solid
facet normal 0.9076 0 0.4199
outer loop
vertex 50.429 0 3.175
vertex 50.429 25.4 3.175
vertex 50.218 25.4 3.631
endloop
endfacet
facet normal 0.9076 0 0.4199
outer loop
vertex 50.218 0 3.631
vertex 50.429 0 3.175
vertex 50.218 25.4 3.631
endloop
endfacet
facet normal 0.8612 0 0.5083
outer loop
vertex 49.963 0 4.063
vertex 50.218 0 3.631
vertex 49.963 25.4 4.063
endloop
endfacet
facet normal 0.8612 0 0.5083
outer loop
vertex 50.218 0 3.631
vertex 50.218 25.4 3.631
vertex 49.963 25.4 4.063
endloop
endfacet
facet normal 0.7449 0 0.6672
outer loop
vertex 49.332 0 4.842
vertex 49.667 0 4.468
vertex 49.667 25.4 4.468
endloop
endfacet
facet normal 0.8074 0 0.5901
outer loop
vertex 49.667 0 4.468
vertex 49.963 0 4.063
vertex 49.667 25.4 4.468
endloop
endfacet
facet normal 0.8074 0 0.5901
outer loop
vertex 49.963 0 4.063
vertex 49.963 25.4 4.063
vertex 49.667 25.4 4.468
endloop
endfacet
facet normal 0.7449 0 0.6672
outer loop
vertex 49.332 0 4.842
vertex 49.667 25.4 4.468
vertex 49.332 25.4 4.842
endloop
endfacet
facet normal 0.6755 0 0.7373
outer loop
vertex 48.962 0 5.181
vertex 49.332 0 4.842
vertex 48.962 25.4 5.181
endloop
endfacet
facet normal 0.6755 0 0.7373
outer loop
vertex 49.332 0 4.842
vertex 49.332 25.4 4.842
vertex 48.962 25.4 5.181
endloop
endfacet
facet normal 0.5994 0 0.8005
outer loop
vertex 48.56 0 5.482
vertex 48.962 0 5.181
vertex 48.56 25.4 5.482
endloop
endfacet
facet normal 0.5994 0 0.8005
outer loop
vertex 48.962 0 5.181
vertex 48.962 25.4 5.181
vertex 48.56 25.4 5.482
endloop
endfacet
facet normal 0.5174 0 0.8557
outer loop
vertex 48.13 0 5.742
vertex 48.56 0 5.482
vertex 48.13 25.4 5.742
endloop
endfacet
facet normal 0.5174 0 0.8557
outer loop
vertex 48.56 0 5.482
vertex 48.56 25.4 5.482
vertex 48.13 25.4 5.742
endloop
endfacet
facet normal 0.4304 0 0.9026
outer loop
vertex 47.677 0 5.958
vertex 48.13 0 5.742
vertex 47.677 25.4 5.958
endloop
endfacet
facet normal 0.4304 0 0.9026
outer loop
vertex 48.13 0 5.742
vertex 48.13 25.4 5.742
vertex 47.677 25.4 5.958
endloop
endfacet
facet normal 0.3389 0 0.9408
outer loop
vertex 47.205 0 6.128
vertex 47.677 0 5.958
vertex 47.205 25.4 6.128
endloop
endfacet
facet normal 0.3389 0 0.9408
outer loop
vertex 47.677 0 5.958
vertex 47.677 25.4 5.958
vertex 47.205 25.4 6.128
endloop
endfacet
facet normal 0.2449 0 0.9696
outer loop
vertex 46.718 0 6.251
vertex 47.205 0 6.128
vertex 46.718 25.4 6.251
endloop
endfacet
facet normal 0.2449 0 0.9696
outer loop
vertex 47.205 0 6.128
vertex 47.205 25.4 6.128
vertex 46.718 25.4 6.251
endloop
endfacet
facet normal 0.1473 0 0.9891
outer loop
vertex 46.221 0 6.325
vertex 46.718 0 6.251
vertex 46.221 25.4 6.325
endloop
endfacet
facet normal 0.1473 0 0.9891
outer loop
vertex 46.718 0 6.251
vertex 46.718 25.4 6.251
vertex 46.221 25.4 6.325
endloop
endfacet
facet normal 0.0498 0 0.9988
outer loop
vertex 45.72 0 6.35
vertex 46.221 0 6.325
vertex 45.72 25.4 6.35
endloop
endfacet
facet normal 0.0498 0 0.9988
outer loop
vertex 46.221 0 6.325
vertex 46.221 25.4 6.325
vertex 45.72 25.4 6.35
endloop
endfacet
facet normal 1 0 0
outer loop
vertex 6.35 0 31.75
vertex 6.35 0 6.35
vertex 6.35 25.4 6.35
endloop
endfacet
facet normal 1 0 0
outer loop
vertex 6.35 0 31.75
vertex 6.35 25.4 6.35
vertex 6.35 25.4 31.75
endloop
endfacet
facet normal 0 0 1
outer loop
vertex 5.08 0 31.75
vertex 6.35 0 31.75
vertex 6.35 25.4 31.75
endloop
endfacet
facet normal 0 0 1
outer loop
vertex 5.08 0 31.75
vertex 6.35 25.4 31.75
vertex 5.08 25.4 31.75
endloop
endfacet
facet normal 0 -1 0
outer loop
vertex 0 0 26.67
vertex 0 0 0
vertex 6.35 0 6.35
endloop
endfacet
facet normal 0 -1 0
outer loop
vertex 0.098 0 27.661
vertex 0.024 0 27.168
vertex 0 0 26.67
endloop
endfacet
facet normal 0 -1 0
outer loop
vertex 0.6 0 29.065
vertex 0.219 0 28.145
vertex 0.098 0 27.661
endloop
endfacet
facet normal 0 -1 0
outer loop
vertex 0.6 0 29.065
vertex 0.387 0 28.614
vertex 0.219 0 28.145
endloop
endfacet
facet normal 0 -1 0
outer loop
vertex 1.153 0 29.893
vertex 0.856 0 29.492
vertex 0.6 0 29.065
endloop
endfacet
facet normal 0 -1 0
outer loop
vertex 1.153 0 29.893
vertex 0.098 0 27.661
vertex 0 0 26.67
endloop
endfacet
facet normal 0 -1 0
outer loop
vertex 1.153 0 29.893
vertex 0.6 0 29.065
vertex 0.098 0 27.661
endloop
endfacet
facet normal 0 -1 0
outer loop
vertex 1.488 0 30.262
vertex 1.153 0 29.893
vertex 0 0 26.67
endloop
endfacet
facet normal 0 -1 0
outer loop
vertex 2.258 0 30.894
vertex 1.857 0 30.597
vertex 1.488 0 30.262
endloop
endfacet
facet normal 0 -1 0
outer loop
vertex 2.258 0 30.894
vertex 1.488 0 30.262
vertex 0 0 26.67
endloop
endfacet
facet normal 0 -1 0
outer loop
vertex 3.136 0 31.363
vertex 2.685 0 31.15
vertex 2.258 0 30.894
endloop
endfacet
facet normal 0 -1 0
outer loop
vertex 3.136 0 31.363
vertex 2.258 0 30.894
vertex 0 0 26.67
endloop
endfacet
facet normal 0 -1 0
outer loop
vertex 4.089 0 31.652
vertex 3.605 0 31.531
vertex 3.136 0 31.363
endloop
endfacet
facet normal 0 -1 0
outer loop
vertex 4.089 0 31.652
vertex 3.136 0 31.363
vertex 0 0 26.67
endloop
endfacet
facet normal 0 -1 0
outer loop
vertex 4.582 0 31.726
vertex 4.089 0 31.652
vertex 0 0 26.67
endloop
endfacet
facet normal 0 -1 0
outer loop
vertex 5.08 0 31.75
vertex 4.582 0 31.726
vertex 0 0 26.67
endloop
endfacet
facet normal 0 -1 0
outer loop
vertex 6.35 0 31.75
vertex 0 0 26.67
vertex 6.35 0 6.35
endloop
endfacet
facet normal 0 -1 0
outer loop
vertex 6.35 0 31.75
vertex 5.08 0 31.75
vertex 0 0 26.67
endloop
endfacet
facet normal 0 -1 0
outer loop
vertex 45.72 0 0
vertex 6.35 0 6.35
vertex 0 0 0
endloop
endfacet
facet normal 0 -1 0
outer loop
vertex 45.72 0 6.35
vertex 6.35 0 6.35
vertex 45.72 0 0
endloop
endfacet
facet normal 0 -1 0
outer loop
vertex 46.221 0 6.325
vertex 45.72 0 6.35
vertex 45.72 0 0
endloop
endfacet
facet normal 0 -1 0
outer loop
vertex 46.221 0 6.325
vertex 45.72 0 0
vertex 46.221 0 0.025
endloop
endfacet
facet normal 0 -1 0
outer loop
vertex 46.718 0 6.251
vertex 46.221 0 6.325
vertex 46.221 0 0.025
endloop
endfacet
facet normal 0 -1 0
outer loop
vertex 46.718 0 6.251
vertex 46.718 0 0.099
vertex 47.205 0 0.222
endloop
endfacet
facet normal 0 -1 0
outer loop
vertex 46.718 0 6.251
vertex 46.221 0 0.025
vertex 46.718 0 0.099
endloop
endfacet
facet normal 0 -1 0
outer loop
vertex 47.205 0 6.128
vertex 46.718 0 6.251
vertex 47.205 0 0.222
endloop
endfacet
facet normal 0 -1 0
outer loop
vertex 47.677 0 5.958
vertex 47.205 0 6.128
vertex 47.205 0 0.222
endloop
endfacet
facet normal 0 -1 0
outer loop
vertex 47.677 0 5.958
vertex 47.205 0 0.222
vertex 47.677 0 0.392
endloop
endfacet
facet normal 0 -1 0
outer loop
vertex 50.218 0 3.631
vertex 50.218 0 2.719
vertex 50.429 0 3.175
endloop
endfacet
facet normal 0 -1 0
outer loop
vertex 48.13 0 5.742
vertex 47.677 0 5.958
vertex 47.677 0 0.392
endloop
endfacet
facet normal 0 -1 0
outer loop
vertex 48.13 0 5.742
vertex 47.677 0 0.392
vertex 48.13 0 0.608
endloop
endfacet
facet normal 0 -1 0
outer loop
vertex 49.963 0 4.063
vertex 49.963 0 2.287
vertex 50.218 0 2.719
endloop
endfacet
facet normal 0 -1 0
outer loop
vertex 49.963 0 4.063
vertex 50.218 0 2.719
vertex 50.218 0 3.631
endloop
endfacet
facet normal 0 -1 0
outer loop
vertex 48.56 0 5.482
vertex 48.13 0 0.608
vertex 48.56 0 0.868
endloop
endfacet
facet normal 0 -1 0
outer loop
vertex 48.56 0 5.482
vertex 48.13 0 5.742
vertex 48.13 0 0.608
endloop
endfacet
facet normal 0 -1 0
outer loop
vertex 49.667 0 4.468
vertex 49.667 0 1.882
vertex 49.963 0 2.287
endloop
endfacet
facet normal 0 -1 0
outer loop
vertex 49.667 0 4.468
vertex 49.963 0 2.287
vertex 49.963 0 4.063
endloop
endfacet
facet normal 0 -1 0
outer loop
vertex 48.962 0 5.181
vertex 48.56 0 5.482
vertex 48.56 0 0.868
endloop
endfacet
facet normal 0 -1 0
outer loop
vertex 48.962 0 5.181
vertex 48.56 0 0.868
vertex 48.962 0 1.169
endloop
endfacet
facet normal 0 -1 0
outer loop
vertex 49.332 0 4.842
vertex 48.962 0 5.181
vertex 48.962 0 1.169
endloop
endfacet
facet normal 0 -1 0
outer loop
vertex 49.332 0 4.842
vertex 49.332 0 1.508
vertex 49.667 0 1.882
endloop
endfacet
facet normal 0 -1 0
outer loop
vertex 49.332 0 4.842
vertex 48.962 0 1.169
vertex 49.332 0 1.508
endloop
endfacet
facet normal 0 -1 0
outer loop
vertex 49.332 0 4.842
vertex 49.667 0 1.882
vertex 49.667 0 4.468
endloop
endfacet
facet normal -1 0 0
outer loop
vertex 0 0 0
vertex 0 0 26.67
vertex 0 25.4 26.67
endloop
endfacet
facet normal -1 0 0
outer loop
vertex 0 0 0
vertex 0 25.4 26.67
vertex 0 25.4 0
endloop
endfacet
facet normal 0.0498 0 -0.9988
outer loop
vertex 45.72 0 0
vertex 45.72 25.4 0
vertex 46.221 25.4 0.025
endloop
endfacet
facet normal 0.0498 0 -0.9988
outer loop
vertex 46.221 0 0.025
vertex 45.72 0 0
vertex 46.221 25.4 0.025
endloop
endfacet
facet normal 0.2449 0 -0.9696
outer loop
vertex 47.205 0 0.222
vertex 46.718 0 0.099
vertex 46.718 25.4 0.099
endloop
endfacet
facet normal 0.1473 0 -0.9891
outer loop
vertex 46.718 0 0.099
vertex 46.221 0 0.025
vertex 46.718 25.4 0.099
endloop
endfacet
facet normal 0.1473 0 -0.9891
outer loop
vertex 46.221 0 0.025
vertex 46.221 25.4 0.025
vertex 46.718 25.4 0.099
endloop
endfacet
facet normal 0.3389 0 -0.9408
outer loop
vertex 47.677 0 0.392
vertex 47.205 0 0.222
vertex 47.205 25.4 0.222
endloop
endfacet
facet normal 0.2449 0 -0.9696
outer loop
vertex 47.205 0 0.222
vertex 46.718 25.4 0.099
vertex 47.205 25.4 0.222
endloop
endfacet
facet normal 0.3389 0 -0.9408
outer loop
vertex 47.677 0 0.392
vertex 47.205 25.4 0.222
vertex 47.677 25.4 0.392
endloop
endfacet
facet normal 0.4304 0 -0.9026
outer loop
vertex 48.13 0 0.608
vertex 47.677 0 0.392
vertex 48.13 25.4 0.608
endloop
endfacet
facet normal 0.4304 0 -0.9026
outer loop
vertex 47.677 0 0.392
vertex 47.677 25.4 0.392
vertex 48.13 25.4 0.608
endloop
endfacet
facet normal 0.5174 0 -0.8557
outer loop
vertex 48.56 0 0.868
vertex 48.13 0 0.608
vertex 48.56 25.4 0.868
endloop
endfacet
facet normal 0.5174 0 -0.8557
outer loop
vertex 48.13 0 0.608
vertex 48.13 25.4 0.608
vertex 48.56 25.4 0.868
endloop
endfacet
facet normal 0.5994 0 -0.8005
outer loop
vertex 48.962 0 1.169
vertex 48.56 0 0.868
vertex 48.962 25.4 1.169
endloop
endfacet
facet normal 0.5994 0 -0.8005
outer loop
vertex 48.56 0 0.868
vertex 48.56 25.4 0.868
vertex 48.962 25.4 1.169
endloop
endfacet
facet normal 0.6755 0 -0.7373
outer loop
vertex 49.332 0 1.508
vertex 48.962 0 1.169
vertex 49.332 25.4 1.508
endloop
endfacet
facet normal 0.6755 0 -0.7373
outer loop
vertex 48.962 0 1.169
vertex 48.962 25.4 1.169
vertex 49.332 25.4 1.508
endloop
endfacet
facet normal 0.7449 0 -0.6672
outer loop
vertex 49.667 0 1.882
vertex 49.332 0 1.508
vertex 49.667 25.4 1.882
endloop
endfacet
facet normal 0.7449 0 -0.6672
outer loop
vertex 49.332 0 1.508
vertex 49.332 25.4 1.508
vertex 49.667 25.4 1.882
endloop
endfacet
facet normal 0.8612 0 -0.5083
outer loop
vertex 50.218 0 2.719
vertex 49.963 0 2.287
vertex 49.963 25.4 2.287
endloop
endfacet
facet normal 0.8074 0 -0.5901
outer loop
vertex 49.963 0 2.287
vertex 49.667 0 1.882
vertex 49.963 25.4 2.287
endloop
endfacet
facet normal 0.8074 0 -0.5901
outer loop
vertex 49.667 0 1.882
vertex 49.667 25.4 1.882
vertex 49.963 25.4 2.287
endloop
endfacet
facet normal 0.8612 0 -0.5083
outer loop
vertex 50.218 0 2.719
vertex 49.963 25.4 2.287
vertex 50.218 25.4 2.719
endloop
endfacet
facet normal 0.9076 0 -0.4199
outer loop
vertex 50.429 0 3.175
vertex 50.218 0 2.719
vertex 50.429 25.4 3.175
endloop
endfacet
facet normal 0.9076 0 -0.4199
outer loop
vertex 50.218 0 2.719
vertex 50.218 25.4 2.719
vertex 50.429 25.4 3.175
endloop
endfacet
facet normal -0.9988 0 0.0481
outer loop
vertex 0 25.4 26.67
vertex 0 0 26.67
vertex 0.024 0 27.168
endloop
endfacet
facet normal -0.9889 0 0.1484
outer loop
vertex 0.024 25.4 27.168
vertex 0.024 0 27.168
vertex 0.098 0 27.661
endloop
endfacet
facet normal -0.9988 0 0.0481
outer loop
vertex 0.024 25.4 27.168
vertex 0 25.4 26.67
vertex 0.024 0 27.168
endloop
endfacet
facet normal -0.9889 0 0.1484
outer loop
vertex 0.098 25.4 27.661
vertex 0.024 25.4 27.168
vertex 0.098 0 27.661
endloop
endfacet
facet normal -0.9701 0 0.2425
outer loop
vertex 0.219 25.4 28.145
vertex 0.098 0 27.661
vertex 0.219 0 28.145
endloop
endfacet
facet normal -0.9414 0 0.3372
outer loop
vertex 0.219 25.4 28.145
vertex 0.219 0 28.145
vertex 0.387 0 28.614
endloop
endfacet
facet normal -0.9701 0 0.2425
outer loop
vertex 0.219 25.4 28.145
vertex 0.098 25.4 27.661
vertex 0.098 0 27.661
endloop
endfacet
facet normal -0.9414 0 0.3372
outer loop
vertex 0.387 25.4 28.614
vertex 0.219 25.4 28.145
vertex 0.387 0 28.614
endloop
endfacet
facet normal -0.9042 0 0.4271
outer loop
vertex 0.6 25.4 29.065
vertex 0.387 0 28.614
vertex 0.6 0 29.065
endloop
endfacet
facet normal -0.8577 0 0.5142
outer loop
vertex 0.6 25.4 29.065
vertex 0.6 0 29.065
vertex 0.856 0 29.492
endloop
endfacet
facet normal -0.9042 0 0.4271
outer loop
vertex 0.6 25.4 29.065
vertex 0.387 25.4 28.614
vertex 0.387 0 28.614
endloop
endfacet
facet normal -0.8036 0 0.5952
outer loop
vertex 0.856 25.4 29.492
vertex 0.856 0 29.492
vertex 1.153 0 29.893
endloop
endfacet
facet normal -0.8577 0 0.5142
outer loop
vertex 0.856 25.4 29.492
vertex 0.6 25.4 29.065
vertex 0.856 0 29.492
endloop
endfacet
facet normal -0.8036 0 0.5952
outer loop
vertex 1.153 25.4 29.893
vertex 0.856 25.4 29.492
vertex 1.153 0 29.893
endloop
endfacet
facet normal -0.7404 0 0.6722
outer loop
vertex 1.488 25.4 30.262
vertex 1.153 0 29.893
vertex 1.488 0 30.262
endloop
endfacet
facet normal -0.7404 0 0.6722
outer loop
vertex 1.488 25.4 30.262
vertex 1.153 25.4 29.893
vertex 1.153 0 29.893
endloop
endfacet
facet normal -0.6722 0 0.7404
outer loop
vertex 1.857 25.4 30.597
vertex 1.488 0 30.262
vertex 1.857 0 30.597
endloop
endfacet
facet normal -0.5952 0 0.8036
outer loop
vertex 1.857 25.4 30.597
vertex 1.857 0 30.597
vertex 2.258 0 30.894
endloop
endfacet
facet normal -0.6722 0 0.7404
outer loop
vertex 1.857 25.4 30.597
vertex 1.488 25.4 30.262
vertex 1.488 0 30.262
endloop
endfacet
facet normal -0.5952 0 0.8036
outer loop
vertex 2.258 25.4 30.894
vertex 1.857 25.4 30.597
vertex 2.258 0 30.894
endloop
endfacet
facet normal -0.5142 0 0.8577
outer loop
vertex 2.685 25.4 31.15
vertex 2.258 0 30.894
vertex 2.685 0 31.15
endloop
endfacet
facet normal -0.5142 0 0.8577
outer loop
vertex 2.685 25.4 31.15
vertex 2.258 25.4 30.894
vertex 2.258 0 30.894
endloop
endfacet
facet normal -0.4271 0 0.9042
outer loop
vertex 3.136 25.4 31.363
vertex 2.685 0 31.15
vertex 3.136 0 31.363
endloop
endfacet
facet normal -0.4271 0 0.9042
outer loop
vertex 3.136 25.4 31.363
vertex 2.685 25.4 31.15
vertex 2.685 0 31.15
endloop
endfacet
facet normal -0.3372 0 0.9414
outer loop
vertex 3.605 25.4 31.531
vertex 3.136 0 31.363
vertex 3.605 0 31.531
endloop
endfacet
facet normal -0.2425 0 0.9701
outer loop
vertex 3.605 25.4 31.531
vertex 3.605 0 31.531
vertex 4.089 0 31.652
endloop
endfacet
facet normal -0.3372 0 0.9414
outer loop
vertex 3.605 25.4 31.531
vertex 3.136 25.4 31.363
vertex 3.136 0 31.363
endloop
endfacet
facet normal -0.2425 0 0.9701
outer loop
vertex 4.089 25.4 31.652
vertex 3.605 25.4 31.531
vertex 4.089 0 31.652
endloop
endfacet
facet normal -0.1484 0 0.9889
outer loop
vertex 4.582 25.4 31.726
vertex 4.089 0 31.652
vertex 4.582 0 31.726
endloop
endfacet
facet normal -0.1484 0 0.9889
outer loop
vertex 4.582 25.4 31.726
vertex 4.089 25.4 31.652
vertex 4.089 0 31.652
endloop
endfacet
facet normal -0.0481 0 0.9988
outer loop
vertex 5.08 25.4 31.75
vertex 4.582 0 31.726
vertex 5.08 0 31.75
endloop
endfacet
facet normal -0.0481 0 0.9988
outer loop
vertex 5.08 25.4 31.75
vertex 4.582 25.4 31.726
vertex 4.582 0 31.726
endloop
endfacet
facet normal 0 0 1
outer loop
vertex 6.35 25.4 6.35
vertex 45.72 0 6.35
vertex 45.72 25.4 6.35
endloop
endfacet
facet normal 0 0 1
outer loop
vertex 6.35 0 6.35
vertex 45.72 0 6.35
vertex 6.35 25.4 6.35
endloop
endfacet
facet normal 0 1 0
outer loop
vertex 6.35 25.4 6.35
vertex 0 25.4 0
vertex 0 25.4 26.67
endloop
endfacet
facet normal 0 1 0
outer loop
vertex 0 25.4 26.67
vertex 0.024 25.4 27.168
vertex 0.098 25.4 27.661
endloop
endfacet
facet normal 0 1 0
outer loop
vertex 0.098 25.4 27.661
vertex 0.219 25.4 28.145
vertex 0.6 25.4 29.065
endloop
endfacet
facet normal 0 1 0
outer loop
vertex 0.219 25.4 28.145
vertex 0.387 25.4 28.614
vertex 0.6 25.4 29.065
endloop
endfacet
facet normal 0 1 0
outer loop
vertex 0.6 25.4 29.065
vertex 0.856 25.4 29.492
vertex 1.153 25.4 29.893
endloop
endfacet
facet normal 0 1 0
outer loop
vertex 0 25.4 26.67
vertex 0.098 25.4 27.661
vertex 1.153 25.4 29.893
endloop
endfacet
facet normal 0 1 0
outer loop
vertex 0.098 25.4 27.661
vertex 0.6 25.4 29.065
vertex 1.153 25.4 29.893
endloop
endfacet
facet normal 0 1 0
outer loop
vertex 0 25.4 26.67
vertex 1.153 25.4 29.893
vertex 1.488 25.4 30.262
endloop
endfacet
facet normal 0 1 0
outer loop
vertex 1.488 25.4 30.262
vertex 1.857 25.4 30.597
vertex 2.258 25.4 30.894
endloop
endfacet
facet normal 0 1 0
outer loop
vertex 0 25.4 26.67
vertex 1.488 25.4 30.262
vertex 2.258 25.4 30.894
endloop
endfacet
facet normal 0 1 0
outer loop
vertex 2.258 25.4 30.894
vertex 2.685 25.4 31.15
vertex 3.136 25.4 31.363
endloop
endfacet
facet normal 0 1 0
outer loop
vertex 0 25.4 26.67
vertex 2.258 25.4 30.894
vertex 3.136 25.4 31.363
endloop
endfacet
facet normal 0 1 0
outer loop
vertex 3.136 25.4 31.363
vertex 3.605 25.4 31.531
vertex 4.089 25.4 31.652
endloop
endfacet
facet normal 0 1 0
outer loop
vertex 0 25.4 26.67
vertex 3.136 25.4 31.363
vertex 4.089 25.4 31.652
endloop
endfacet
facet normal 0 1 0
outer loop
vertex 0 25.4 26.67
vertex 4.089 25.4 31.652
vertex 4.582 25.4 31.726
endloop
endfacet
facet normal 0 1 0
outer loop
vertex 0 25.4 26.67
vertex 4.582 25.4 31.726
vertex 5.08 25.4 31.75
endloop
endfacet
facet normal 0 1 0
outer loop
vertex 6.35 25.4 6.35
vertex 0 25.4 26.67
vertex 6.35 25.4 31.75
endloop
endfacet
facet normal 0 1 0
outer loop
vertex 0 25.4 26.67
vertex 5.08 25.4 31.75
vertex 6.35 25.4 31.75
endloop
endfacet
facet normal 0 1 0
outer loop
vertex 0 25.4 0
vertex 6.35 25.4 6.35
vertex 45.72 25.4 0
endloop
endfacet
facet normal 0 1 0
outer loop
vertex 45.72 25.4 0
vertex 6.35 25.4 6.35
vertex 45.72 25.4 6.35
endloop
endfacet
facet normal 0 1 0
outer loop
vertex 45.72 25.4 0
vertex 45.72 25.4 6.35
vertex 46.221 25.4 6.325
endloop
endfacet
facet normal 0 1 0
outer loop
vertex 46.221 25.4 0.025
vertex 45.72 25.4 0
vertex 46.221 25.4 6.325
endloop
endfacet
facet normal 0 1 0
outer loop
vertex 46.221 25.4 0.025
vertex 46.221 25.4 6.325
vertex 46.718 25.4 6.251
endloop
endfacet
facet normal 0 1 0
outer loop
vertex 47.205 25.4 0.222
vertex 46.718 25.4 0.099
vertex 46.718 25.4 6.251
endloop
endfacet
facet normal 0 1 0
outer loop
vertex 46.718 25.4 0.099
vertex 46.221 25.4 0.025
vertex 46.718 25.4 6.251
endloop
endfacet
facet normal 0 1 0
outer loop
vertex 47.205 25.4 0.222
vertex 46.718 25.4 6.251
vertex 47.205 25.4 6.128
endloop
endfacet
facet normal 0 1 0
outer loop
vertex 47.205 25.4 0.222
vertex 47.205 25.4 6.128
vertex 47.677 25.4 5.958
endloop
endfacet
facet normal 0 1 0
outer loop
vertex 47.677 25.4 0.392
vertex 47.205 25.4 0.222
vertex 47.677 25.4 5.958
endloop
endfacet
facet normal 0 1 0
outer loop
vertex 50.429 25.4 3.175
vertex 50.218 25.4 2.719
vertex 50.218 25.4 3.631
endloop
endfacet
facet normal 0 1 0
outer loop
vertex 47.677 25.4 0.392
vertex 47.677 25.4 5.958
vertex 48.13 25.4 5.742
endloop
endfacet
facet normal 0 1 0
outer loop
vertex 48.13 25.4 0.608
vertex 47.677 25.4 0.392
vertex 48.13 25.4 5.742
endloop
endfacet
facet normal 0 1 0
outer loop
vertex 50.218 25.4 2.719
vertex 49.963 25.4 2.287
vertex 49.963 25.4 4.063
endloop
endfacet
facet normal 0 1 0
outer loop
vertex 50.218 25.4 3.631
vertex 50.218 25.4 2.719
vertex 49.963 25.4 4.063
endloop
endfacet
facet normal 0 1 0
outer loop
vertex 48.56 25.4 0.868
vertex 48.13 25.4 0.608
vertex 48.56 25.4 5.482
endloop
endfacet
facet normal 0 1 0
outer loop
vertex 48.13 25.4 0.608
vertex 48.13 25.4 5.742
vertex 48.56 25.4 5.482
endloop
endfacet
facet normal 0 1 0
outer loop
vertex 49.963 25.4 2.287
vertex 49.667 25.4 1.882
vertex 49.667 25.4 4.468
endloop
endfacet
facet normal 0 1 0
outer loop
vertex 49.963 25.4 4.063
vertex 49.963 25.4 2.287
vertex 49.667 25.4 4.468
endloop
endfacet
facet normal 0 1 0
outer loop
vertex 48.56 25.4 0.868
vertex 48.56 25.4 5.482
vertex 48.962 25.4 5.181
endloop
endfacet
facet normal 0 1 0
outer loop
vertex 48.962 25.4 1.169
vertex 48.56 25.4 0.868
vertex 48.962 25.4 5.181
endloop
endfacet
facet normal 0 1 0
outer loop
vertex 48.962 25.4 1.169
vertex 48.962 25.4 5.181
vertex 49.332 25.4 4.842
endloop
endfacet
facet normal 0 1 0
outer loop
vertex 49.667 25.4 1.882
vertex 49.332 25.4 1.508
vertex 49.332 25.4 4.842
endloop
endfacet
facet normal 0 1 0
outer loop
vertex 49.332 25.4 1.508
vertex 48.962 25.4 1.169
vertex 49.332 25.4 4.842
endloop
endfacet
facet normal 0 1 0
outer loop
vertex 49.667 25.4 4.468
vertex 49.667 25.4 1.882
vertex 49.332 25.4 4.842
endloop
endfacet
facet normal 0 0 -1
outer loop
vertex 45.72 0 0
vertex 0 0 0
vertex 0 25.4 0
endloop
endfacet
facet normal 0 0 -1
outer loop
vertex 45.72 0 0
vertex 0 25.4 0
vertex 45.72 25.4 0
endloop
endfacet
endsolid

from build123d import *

# Parameters (mm, degrees)
F1_DEPTH    = 25.4
F2_T1_DEPTH = 50.8
F3_R        = 5.08


# Not quite as in the source:
# - a fillet or chamfer that OpenCascade refuses, or shapes differently, is made with other operations: its cross-section is extruded or revolved along the edge and cut away or added


with BuildPart() as f1:
    # F0 (on Front) → F1 (new body)
    with BuildSketch(Plane.XZ):
        Polygon((0, 31.75), (0, 0), (50.8, 0), (50.8, 6.35), (6.35, 6.35), (6.35, 31.75), align=None)
    extrude(amount=-F1_DEPTH)

    # F2: fillet of radius 5.08 on 2 edges, made by hand

    # F2_s2 → F2_t1 (cut)
    with BuildSketch(Plane.XZ.offset(-38.1)):
        with BuildLine():
            ThreePointArc((50.8, 1.27), (49.3121024484, 4.8621024484), (45.72, 6.35))
            Line((45.72, 6.35), (50.8, 6.35))
            Line((50.8, 6.35), (50.8, 1.27))
        make_face()
        with BuildLine():
            ThreePointArc((45.72, 0), (49.3121024484, 1.4878975516), (50.8, 5.08))
            Line((50.8, 5.08), (50.8, 0))
            Line((50.8, 0), (45.72, 0))
        make_face()
    extrude(amount=F2_T1_DEPTH, mode=Mode.SUBTRACT)

    # F3
    f3_edges = [f1.edges().sort_by_distance(p)[0] for p in [
        (0, 12.7, 31.75),
    ]]
    fillet(f3_edges, radius=F3_R)


solid = f1.part
